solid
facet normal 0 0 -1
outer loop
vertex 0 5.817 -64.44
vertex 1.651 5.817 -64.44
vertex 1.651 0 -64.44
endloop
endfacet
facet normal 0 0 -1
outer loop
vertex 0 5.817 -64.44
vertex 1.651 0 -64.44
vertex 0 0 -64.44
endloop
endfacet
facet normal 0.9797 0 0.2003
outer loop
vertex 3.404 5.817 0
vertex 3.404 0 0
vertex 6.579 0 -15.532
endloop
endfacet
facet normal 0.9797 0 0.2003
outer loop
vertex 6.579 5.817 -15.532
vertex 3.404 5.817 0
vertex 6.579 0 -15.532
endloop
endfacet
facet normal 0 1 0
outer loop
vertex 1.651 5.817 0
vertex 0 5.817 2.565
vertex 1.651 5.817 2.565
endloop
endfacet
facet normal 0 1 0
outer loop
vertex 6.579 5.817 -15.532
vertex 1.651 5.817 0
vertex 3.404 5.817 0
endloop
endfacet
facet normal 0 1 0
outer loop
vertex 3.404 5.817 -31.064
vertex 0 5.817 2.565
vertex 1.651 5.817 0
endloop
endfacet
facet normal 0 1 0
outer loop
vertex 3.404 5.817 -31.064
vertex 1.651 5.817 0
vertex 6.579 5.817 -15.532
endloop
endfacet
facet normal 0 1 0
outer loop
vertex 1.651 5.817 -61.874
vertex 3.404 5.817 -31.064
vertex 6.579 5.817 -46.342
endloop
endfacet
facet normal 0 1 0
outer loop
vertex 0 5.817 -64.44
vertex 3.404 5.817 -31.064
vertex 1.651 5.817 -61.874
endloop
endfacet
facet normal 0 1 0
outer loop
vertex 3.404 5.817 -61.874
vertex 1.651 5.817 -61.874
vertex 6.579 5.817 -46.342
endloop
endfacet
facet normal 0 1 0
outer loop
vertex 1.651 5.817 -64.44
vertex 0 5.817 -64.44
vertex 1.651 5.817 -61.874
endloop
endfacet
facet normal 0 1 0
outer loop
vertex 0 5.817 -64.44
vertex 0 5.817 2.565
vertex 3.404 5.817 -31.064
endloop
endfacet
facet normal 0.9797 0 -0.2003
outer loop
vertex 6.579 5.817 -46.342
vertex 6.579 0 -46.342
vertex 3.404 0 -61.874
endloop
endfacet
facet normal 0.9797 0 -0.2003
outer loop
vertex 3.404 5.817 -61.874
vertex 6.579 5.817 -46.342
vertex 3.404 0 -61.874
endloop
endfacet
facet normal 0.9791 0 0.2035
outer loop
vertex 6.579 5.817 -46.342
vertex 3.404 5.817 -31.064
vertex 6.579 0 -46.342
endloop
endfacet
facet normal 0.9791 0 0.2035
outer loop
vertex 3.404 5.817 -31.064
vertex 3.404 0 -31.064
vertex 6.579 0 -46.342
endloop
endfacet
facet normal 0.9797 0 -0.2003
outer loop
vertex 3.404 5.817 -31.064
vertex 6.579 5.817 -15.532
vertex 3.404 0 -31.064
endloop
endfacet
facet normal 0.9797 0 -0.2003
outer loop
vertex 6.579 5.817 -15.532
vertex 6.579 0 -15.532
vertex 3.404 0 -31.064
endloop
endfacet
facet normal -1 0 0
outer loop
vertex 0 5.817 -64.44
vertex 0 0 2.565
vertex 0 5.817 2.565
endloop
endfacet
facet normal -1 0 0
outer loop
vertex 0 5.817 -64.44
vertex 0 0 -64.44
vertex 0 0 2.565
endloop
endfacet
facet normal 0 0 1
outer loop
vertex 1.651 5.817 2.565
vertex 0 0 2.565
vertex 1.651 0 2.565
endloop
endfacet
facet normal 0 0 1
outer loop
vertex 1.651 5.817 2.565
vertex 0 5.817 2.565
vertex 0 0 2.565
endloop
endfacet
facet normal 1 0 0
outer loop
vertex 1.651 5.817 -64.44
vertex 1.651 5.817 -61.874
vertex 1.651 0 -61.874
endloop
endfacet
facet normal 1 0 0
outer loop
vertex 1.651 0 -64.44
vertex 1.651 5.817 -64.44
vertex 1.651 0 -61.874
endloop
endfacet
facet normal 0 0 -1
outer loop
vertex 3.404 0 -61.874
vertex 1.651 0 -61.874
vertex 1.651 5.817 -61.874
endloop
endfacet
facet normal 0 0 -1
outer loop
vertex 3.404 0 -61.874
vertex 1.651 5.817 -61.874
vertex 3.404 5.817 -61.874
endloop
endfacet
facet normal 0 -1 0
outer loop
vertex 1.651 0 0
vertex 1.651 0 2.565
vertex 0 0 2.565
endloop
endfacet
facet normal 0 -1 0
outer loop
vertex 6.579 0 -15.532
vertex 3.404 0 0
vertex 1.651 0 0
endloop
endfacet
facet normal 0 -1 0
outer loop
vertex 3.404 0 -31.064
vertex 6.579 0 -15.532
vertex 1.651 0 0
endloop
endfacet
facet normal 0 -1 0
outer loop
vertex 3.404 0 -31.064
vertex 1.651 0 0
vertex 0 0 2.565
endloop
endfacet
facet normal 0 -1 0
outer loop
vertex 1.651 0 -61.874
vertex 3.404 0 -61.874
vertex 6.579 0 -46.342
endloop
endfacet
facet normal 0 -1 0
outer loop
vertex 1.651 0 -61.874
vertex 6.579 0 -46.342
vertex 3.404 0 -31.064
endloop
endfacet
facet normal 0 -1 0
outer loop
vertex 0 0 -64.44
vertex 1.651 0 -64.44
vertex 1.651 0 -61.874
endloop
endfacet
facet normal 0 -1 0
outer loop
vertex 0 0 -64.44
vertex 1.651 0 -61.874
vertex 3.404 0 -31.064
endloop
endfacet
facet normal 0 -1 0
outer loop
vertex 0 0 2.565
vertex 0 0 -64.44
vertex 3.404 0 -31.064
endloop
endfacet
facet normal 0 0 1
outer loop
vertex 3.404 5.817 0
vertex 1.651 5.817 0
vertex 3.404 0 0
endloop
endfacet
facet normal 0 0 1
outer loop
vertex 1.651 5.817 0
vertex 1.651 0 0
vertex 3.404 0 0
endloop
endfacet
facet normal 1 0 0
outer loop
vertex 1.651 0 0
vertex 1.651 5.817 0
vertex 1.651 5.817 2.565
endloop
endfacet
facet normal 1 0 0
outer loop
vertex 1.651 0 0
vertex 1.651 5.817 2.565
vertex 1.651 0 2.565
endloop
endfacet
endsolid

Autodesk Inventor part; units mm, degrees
ref_plane "YZ Plane" through (0, 0, 0) normal (1, 0, 0) x (0, 1, 0)
ref_plane "XZ Plane" through (0, 0, 0) normal (0, 1, 0) x (-1, 0, 0)
ref_plane "XY Plane" through (0, 0, 0) normal (0, 0, 1) x (1, 0, 0)
sketch "Sketch1" plane through (0, 0, 0) normal (0, 1, 0) x (-1, 0, 0)
  line L0 (0, 0) -> (0, -61.8744)
  line L1 (0, 0) -> (-3.4036, 0)
  line L2 (0, -61.8744) -> (-3.4036, -61.8744)
  line L3 (-3.4036, 0) -> (-6.5786, -15.5321)
  line L4 (-6.5786, -15.5321) -> (-3.4036, -31.0642)
  line L5 (-3.4036, -31.0642) -> (-6.5786, -46.3423)
  line L6 (-6.5786, -46.3423) -> (-3.4036, -61.8744)
  dimension "d0" = 61.8744
  dimension "d1" = 3.4036
  dimension "d2" = 3.4036
  dimension "d3" = 15.5321
  dimension "d4" = 31.0642
  dimension "d5" = 15.5321
  dimension "d6" = 3.175
  dimension "d7" = 3.175
extrude "Extrusion1" add sketch "Sketch1" along normal blind 5.8166
sketch "Sketch2" plane through (0, 0, 0) normal (0, 0, 1) x (1, 0, 0)
  line L0 (3.4036, 0) -> (0, 0) projected
  line L1 (0, 5.8166) -> (1.651, 5.8166)
  line L2 (1.651, 5.8166) -> (1.651, 0)
  line L3 (1.651, 0) -> (0, 0)
  line L4 (0, 0) -> (0, 5.8166)
  dimension "d10" = 1.651
sketch "Sketch3" plane through (3.4036, 0, -61.8744) normal (0, 0, -1) x (-1, 0, 0)
  line L0 (0, 0) -> (3.4036, 0) projected
  line L1 (3.4036, 5.8166) -> (1.7526, 5.8166)
  line L2 (1.7526, 5.8166) -> (1.7526, 0)
  line L3 (1.7526, 0) -> (3.4036, 0)
  line L4 (3.4036, 0) -> (3.4036, 5.8166)
  dimension "d11" = 1.651
extrude "Extrusion2" add sketch "Sketch3" along normal blind 2.5654
extrude "Extrusion3" add sketch "Sketch2" along normal blind 2.5654
properties part number "Short_insert_CPY3_CPY"
